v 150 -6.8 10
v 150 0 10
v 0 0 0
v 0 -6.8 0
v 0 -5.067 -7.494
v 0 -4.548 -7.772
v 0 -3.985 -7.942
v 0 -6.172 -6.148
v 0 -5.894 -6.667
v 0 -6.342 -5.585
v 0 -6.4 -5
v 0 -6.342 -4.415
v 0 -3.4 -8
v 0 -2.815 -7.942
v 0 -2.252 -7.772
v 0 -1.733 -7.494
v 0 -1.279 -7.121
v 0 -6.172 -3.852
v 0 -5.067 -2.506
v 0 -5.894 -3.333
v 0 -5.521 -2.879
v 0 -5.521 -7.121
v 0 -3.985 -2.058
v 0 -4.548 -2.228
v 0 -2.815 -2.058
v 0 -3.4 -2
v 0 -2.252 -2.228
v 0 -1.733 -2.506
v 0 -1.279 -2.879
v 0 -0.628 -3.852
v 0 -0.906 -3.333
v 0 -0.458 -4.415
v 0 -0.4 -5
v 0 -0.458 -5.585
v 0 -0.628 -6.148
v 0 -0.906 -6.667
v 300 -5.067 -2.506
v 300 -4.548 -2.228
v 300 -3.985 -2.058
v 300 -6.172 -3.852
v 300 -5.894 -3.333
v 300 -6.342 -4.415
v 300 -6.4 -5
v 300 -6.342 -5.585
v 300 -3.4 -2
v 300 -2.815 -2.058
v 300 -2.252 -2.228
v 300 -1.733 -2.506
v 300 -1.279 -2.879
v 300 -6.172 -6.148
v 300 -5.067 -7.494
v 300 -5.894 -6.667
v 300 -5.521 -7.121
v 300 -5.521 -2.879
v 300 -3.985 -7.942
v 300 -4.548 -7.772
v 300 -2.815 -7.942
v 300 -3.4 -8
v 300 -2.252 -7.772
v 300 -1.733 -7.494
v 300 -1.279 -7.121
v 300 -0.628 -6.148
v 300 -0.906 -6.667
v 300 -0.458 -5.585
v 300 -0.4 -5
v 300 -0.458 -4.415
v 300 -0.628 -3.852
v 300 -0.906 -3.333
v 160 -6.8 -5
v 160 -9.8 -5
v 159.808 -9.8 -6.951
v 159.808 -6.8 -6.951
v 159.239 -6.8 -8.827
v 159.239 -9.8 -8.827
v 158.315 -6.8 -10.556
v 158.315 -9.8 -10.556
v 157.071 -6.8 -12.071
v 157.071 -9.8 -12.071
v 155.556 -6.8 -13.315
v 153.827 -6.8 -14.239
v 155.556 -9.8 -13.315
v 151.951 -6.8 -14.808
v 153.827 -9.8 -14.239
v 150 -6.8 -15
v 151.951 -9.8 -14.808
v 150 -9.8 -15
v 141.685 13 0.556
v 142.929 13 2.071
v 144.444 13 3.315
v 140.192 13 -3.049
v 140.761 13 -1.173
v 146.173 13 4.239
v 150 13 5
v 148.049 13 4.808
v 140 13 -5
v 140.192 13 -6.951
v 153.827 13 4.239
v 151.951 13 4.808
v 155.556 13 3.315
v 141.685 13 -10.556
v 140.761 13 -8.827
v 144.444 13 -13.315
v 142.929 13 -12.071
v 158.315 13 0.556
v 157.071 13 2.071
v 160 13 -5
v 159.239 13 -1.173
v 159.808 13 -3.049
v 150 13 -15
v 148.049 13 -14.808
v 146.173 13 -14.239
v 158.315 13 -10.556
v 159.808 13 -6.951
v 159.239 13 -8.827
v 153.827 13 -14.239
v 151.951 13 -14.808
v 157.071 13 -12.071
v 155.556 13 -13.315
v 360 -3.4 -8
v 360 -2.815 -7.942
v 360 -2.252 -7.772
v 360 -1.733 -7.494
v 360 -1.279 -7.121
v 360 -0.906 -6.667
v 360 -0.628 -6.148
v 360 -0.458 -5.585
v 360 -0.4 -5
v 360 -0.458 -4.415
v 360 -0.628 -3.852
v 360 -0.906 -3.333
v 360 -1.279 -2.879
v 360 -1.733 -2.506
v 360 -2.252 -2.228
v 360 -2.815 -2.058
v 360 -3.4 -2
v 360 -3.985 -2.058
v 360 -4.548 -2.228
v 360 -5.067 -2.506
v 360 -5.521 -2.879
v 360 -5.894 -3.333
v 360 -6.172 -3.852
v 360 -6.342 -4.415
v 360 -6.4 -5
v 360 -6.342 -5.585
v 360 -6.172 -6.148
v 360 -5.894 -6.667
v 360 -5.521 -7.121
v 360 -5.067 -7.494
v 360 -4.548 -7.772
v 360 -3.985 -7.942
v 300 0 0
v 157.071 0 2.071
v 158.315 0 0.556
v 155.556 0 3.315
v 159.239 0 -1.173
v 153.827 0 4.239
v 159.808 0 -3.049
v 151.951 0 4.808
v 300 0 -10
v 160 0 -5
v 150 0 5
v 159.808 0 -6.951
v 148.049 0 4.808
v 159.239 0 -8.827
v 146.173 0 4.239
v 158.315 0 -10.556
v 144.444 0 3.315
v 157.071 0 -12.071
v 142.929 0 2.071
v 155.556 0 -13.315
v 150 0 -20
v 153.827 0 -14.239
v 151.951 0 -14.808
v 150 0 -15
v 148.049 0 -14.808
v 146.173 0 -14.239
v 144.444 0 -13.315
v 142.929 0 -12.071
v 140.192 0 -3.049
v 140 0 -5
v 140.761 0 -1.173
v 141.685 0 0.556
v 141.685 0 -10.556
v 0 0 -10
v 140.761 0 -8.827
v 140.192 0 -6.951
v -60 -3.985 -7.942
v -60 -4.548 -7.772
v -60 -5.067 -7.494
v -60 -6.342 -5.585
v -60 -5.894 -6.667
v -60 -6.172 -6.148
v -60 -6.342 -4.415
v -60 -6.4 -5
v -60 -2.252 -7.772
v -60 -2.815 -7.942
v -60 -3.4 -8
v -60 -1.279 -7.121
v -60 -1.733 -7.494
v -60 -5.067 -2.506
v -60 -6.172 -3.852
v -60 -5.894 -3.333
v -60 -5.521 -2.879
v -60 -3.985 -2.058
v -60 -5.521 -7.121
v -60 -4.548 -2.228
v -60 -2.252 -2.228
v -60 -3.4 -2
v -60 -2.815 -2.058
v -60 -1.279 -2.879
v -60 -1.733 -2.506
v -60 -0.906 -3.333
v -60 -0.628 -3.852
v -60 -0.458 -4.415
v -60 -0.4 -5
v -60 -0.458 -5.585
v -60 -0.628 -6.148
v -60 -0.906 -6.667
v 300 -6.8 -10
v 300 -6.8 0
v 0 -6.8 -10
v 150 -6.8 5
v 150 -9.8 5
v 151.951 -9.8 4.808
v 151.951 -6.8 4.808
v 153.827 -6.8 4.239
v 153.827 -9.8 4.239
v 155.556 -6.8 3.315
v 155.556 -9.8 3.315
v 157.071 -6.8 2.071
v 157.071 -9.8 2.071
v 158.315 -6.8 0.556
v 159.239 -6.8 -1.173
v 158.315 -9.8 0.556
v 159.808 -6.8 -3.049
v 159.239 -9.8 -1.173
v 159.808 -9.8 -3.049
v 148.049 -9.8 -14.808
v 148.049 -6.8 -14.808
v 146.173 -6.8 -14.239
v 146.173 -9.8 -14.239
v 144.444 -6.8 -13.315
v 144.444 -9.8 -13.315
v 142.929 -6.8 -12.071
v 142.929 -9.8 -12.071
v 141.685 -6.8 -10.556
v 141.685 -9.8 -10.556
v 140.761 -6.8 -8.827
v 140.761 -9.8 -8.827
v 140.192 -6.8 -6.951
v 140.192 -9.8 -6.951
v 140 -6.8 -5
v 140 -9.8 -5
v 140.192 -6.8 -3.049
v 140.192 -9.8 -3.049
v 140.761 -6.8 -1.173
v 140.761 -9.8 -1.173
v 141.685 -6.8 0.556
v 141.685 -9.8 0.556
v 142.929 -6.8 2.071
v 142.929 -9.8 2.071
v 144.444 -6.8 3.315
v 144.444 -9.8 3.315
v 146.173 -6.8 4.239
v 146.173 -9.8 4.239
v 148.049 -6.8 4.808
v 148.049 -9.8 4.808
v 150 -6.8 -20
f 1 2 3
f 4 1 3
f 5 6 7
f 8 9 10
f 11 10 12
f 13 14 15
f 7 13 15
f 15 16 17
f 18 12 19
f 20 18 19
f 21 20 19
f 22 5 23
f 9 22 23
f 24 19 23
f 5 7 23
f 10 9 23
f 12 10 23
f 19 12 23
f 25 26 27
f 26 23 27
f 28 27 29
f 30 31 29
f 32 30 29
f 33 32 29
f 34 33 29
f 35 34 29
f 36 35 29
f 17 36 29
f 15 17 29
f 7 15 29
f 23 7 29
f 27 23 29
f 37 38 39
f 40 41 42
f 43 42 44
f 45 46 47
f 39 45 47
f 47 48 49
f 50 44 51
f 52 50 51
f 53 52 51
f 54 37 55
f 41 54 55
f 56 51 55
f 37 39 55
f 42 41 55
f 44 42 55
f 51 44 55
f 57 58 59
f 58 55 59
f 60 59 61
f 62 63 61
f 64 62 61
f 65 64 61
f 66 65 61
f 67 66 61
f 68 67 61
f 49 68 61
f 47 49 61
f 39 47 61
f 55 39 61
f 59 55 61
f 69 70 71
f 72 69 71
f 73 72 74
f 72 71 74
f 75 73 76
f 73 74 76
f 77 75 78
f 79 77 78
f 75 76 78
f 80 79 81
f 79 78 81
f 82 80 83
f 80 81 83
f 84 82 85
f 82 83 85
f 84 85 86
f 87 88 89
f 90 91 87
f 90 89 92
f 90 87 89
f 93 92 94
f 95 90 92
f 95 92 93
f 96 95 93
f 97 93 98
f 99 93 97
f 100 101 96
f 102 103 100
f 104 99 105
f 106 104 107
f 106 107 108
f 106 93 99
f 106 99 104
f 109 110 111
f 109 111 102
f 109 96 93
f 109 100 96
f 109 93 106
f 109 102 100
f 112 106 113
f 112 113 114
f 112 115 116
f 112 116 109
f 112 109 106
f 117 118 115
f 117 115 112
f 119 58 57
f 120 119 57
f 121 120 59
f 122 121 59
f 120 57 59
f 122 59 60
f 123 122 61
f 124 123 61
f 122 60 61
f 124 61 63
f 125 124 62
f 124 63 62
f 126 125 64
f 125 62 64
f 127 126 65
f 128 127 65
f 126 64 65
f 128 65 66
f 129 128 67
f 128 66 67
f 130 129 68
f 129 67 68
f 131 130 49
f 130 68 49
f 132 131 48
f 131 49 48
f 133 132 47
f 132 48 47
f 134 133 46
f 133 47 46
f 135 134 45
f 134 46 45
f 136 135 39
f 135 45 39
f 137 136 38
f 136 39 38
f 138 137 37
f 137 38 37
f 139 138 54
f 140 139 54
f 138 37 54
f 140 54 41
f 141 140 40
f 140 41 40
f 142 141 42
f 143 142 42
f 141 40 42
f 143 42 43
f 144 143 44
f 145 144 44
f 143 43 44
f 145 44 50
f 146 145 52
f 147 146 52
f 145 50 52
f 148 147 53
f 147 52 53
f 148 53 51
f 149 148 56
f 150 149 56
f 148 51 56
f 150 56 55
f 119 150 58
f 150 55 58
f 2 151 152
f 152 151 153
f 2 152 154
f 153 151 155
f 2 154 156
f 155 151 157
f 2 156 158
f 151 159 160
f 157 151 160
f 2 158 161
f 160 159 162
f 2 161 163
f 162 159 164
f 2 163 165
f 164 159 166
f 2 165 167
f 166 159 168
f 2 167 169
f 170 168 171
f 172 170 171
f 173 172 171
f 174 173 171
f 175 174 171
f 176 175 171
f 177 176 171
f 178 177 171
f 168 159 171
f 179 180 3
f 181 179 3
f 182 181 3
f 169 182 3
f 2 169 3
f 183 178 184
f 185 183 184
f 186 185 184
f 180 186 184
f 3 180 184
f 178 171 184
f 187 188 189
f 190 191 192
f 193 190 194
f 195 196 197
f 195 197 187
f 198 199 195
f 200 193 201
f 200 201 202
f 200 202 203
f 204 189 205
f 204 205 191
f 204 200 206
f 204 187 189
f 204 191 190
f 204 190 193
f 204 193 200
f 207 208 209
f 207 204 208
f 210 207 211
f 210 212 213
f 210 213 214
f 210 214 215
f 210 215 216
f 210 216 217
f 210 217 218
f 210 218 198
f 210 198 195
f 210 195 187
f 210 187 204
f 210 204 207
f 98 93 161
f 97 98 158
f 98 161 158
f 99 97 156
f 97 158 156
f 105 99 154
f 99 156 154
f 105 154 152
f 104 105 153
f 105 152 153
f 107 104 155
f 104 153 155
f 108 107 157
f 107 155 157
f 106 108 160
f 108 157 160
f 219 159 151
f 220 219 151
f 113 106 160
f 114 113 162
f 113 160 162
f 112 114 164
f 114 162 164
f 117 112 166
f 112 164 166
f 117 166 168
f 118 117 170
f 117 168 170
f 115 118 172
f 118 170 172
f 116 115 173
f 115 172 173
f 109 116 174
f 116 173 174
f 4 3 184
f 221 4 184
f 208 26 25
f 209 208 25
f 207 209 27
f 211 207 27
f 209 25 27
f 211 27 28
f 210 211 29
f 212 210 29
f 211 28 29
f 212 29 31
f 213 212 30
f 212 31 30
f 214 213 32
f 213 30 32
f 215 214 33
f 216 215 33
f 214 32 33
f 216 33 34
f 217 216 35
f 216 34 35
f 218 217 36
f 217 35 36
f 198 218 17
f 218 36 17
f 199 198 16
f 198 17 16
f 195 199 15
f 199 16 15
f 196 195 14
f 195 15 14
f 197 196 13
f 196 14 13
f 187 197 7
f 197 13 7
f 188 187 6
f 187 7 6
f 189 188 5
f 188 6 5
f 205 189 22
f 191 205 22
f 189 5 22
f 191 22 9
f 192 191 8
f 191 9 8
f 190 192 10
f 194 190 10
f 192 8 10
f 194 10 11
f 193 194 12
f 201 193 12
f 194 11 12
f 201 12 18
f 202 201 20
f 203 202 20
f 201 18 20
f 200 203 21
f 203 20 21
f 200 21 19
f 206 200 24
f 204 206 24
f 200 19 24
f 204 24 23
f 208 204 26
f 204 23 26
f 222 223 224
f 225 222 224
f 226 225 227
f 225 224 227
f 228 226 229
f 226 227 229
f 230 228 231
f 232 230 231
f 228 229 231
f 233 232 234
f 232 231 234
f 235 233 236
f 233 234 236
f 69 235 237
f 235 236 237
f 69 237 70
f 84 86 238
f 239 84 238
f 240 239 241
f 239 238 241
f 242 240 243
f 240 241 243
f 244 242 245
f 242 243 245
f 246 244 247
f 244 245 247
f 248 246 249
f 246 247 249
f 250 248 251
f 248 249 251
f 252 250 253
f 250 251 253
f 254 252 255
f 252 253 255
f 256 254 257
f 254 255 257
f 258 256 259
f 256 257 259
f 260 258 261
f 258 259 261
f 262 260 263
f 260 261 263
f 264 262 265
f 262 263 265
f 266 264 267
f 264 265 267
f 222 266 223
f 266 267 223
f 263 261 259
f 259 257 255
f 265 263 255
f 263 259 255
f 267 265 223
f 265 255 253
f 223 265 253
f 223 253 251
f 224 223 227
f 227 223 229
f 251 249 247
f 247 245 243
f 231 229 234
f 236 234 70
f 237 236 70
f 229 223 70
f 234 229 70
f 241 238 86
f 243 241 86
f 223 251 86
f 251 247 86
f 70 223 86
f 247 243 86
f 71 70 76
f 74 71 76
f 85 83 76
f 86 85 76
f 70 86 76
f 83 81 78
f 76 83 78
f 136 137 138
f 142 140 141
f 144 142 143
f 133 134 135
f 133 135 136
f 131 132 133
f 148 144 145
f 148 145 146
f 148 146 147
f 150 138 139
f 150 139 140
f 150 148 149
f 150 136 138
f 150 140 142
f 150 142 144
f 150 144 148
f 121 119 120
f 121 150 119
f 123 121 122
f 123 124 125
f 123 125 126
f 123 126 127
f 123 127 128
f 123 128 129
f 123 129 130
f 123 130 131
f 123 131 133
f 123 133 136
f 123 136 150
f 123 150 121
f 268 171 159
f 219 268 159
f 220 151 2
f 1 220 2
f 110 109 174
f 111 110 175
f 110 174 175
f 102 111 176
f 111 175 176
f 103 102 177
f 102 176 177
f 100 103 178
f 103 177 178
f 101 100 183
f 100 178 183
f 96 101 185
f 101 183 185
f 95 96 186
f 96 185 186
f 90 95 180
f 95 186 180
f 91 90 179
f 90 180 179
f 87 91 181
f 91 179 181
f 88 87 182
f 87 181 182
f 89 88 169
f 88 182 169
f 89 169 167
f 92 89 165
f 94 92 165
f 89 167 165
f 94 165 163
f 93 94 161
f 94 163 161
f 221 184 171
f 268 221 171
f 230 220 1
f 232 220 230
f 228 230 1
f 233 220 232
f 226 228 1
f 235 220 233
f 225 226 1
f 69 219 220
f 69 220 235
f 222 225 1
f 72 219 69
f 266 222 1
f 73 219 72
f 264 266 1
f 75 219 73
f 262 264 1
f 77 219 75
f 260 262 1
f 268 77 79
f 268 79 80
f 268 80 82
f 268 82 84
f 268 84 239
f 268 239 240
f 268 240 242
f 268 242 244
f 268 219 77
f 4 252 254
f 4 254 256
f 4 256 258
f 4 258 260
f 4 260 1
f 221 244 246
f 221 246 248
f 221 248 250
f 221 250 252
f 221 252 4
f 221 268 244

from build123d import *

# Parameters (mm, degrees)
SKETCH2_R                = 10
BASE_FLANGE1_DEPTH       = 6.8
SKETCH7_R                = 3
BASE_FLANGE3_DEPTH       = 60
SKETCH14_R               = 3
BASE_FLANGE4_DEPTH       = 60
BOSS_EXTRUDE1_DEPTH      = 13
BOSS_EXTRUDE1_DEPTH_BACK = 9.8


# Sheet-metal steps are written as plain solids
with BuildPart() as part:
    # Sketch2 → Base-Flange1 (new body)
    with BuildSketch(Plane(origin=(0, 0, 0), x_dir=(1, 0, 0), z_dir=(0, 1, 0))):
        Polygon((0, 0), (0, 10), (150, 20), (300, 10), (300, 0), (150, -10), align=None)
        with Locations(Location((150, 5, 0), (0, 0, 270))):
            Circle(SKETCH2_R, mode=Mode.SUBTRACT)
    extrude(amount=-BASE_FLANGE1_DEPTH)

    # Sketch2<2> → Boss-Extrude1 (add, two sides: drawn at the far end of the back side and taken through both)
    with BuildSketch(Plane(origin=(0, 0, 0), x_dir=(1, 0, 0), z_dir=(0, 1, 0)).offset(-BOSS_EXTRUDE1_DEPTH_BACK)):
        with BuildLine():
            ThreePointArc((150, 15), (140, 5), (150, -5))
            Line((150, -5), (150, 15))
        make_face()
        with BuildLine():
            Line((150, 15), (150, -5))
            ThreePointArc((150, -5), (157.071067812, -2.071067812), (160, 5))
            ThreePointArc((160, 5), (157.071067812, 12.071067812), (150, 15))
        make_face()
    extrude(amount=BOSS_EXTRUDE1_DEPTH + BOSS_EXTRUDE1_DEPTH_BACK)


with BuildPart() as body_2:
    # Sketch7 → Base-Flange3 (new body)
    with BuildSketch(Plane.ZY):
        with Locations((-5, -3.4)):
            Circle(SKETCH7_R)
    extrude(amount=BASE_FLANGE3_DEPTH)


with BuildPart() as body_3:
    # Sketch14 → Base-Flange4 (new body)
    with BuildSketch(Plane(origin=(300, 0, 0), x_dir=(0, 0, -1), z_dir=(1, 0, 0))):
        with Locations((5, -3.4)):
            Circle(SKETCH14_R)
    extrude(amount=BASE_FLANGE4_DEPTH)


solid = Compound([part.part, body_2.part, body_3.part])
